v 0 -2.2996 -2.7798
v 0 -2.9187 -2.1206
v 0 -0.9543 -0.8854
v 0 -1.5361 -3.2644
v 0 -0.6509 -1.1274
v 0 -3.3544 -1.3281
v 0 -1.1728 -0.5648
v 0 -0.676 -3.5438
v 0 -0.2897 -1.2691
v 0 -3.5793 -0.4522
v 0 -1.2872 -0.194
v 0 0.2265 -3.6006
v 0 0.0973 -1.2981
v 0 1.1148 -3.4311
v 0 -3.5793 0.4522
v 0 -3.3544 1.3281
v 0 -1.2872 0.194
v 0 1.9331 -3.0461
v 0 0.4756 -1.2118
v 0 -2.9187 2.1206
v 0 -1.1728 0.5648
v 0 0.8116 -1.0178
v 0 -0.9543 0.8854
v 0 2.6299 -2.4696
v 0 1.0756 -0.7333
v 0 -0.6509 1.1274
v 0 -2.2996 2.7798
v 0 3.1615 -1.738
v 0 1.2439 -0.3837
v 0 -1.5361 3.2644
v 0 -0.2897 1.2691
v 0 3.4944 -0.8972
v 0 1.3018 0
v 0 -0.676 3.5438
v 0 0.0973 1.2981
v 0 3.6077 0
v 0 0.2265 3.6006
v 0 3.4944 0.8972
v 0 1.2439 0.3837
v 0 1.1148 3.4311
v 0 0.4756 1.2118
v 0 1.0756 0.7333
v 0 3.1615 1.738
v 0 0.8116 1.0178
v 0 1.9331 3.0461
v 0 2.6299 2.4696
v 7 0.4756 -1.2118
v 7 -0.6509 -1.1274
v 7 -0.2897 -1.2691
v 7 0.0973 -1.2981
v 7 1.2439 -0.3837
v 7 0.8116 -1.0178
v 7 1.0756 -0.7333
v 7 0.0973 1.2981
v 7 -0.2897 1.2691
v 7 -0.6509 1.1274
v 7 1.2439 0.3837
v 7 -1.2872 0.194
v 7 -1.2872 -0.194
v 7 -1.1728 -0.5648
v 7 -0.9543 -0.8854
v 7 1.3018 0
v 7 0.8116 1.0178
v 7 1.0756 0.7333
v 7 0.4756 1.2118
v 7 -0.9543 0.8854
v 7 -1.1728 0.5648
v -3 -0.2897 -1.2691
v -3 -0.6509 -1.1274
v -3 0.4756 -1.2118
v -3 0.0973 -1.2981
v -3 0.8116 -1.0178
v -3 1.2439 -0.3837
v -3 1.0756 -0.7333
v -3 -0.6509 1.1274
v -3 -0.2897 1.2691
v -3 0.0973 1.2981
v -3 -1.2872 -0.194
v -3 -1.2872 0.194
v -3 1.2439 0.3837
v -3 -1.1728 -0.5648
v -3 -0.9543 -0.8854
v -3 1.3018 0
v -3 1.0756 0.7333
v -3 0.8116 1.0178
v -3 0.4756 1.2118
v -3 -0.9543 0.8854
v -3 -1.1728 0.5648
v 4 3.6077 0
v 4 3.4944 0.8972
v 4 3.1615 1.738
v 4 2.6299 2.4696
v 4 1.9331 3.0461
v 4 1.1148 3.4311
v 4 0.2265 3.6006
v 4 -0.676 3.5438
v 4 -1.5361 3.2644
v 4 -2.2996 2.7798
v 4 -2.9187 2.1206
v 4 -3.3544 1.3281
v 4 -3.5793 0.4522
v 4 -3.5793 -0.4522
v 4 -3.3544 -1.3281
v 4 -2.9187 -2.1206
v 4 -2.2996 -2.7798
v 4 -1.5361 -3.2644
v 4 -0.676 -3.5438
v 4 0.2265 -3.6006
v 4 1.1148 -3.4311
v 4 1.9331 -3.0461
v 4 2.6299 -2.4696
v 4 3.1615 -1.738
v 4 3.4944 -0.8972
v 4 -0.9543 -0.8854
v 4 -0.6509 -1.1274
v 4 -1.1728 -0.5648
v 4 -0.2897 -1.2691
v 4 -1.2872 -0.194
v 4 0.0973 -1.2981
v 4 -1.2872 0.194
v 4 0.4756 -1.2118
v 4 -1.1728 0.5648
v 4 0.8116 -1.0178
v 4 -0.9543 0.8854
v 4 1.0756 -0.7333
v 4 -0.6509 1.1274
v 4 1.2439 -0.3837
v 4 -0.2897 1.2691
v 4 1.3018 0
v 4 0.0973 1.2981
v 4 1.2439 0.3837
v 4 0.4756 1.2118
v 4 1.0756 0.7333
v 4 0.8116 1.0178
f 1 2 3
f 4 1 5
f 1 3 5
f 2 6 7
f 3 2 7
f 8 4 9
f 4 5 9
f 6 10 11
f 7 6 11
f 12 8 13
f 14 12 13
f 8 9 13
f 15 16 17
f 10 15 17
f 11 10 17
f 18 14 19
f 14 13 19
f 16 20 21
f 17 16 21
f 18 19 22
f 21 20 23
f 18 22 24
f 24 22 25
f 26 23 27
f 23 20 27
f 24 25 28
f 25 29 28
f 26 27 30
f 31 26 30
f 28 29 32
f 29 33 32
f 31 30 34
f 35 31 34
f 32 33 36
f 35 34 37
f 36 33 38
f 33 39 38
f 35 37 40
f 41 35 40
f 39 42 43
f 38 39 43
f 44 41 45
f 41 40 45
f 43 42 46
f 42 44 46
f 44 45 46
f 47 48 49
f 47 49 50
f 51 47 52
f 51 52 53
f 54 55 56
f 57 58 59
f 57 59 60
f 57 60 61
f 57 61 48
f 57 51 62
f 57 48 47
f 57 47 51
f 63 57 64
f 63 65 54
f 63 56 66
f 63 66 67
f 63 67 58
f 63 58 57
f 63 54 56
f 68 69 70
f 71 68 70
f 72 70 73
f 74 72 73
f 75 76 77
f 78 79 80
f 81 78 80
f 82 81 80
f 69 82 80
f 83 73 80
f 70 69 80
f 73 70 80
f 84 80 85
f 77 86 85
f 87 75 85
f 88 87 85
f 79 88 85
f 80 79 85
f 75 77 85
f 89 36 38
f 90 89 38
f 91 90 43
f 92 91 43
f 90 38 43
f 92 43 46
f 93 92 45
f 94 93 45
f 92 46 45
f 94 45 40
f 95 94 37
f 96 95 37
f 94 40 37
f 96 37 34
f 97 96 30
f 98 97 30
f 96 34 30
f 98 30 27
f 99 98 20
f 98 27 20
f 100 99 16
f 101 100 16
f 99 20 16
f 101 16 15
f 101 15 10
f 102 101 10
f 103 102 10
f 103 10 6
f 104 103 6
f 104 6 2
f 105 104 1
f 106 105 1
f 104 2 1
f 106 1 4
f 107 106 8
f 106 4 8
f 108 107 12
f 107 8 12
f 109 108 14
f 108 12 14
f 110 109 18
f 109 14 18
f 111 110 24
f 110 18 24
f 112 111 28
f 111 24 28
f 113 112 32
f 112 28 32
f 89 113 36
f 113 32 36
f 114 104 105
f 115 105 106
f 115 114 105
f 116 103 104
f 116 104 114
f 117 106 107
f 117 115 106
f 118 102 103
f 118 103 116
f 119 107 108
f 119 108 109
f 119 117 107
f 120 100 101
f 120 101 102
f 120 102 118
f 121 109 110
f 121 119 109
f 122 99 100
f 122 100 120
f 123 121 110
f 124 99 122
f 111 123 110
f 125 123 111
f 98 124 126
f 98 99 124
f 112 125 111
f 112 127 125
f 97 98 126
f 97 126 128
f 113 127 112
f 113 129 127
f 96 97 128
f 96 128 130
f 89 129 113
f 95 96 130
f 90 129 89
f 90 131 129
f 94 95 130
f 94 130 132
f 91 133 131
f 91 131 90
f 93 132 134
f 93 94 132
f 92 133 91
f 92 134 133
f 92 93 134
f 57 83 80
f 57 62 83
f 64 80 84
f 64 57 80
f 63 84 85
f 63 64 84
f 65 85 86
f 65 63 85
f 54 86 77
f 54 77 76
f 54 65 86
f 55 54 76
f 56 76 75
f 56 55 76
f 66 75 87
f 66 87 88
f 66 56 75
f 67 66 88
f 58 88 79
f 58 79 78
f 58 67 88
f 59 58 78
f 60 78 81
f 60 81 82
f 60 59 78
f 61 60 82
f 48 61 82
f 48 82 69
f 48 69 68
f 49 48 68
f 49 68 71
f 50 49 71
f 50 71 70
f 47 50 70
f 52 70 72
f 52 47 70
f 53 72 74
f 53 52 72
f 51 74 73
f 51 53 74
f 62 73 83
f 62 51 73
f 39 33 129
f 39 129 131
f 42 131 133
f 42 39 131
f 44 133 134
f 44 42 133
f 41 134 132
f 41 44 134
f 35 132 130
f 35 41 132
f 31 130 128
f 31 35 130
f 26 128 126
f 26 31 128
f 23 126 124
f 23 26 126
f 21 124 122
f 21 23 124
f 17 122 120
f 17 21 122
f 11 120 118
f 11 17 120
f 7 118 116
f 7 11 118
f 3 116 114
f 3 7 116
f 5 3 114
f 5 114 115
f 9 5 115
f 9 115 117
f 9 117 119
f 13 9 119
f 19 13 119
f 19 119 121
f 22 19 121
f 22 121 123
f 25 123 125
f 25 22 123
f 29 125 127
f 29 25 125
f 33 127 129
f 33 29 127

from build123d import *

# Parameters (mm, degrees)
F0_R          = 3.607713
F0_R_2        = 1.301758
F1_DEPTH      = 4
F2_DEPTH      = 7
F2_DEPTH_BACK = 3


with BuildPart() as f1:
    # F0 (on Right) → F1 (new body)
    with BuildSketch(Plane.YZ):
        Circle(F0_R)
        Circle(F0_R_2, mode=Mode.SUBTRACT)
    extrude(amount=F1_DEPTH)


with BuildPart() as f2:
    # F0 (on Right) → F2 (new body, two sides)
    with BuildSketch(Plane.YZ) as f2_sk:
        Circle(F0_R_2)
    extrude(amount=F2_DEPTH)
    extrude(f2_sk.sketch, amount=-F2_DEPTH_BACK)


solid = Compound([f1.part, f2.part])
